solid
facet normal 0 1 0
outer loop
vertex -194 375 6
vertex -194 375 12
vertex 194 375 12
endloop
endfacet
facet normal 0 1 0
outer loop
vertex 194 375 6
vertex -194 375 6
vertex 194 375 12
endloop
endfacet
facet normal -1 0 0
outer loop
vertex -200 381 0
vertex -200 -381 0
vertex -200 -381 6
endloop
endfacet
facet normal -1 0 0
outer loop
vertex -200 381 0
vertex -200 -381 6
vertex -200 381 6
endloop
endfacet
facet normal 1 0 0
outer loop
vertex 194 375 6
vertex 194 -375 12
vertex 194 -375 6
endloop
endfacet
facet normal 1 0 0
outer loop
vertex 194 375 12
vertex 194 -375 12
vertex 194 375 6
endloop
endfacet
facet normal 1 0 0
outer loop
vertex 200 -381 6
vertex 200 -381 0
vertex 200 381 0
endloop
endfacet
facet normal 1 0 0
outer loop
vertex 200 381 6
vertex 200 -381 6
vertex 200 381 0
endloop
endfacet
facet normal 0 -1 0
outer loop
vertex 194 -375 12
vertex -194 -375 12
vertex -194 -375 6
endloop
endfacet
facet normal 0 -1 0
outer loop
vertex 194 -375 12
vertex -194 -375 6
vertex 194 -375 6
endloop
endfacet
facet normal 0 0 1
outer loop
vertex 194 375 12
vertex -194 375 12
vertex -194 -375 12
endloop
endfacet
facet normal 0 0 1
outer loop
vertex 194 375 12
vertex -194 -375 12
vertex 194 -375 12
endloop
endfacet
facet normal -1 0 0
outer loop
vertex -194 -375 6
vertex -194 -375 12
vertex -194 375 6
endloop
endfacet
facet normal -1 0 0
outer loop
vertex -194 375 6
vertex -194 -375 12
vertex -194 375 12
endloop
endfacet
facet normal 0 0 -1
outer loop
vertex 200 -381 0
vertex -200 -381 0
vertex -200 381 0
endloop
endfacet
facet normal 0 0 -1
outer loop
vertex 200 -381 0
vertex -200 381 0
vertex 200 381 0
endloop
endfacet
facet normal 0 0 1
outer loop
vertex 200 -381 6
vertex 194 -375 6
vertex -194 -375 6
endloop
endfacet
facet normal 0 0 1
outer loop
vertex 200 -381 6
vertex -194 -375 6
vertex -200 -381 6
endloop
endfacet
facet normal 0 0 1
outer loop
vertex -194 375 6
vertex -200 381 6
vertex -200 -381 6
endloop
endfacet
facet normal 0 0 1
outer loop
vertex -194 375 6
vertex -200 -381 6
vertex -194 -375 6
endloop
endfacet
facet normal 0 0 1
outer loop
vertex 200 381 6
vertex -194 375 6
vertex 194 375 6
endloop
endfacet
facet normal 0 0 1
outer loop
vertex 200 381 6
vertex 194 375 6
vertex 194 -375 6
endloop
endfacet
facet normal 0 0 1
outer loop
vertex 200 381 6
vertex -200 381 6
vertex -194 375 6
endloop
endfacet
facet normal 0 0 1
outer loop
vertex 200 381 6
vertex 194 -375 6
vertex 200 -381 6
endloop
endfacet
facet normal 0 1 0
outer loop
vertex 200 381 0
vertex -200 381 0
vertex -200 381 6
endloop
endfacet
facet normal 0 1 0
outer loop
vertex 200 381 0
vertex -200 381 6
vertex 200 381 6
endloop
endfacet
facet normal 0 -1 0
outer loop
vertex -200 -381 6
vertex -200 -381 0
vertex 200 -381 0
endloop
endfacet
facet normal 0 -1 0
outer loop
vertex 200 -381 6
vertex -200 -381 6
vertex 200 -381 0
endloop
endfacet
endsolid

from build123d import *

# Parameters (mm, degrees)
F0_W     = 400
F0_H     = 762
F1_DEPTH = 12
F2_W     = 6
F2_H     = 762
F3_DEPTH = 6
F4_W     = 6
F4_H     = 762
F5_DEPTH = 6
F6_W     = 388
F6_H     = 6
F7_DEPTH = 6
F8_W     = 388
F8_H     = 6
F9_DEPTH = 6


with BuildPart() as f1:
    # F0 (on Top) → F1 (new body)
    with BuildSketch(Plane.XY):
        Rectangle(F0_W, F0_H)
    extrude(amount=F1_DEPTH)

    # F2 (on face) → F3 (cut)
    with BuildSketch(Plane.XY.offset(12)):
        with Locations((-197, 0)):
            Rectangle(F2_W, F2_H)
    extrude(amount=-F3_DEPTH, mode=Mode.SUBTRACT)

    # F4 (on face) → F5 (cut)
    with BuildSketch(Plane.XY.offset(12)):
        with Locations((197, 0)):
            Rectangle(F4_W, F4_H)
    extrude(amount=-F5_DEPTH, mode=Mode.SUBTRACT)

    # F6 (on face) → F7 (cut)
    with BuildSketch(Plane.XY.offset(12)):
        with Locations((0, 378)):
            Rectangle(F6_W, F6_H)
    extrude(amount=-F7_DEPTH, mode=Mode.SUBTRACT)

    # F8 (on face) → F9 (cut)
    with BuildSketch(Plane.XY.offset(12)):
        with Locations((0, -378)):
            Rectangle(F8_W, F8_H)
    extrude(amount=-F9_DEPTH, mode=Mode.SUBTRACT)


solid = f1.part
